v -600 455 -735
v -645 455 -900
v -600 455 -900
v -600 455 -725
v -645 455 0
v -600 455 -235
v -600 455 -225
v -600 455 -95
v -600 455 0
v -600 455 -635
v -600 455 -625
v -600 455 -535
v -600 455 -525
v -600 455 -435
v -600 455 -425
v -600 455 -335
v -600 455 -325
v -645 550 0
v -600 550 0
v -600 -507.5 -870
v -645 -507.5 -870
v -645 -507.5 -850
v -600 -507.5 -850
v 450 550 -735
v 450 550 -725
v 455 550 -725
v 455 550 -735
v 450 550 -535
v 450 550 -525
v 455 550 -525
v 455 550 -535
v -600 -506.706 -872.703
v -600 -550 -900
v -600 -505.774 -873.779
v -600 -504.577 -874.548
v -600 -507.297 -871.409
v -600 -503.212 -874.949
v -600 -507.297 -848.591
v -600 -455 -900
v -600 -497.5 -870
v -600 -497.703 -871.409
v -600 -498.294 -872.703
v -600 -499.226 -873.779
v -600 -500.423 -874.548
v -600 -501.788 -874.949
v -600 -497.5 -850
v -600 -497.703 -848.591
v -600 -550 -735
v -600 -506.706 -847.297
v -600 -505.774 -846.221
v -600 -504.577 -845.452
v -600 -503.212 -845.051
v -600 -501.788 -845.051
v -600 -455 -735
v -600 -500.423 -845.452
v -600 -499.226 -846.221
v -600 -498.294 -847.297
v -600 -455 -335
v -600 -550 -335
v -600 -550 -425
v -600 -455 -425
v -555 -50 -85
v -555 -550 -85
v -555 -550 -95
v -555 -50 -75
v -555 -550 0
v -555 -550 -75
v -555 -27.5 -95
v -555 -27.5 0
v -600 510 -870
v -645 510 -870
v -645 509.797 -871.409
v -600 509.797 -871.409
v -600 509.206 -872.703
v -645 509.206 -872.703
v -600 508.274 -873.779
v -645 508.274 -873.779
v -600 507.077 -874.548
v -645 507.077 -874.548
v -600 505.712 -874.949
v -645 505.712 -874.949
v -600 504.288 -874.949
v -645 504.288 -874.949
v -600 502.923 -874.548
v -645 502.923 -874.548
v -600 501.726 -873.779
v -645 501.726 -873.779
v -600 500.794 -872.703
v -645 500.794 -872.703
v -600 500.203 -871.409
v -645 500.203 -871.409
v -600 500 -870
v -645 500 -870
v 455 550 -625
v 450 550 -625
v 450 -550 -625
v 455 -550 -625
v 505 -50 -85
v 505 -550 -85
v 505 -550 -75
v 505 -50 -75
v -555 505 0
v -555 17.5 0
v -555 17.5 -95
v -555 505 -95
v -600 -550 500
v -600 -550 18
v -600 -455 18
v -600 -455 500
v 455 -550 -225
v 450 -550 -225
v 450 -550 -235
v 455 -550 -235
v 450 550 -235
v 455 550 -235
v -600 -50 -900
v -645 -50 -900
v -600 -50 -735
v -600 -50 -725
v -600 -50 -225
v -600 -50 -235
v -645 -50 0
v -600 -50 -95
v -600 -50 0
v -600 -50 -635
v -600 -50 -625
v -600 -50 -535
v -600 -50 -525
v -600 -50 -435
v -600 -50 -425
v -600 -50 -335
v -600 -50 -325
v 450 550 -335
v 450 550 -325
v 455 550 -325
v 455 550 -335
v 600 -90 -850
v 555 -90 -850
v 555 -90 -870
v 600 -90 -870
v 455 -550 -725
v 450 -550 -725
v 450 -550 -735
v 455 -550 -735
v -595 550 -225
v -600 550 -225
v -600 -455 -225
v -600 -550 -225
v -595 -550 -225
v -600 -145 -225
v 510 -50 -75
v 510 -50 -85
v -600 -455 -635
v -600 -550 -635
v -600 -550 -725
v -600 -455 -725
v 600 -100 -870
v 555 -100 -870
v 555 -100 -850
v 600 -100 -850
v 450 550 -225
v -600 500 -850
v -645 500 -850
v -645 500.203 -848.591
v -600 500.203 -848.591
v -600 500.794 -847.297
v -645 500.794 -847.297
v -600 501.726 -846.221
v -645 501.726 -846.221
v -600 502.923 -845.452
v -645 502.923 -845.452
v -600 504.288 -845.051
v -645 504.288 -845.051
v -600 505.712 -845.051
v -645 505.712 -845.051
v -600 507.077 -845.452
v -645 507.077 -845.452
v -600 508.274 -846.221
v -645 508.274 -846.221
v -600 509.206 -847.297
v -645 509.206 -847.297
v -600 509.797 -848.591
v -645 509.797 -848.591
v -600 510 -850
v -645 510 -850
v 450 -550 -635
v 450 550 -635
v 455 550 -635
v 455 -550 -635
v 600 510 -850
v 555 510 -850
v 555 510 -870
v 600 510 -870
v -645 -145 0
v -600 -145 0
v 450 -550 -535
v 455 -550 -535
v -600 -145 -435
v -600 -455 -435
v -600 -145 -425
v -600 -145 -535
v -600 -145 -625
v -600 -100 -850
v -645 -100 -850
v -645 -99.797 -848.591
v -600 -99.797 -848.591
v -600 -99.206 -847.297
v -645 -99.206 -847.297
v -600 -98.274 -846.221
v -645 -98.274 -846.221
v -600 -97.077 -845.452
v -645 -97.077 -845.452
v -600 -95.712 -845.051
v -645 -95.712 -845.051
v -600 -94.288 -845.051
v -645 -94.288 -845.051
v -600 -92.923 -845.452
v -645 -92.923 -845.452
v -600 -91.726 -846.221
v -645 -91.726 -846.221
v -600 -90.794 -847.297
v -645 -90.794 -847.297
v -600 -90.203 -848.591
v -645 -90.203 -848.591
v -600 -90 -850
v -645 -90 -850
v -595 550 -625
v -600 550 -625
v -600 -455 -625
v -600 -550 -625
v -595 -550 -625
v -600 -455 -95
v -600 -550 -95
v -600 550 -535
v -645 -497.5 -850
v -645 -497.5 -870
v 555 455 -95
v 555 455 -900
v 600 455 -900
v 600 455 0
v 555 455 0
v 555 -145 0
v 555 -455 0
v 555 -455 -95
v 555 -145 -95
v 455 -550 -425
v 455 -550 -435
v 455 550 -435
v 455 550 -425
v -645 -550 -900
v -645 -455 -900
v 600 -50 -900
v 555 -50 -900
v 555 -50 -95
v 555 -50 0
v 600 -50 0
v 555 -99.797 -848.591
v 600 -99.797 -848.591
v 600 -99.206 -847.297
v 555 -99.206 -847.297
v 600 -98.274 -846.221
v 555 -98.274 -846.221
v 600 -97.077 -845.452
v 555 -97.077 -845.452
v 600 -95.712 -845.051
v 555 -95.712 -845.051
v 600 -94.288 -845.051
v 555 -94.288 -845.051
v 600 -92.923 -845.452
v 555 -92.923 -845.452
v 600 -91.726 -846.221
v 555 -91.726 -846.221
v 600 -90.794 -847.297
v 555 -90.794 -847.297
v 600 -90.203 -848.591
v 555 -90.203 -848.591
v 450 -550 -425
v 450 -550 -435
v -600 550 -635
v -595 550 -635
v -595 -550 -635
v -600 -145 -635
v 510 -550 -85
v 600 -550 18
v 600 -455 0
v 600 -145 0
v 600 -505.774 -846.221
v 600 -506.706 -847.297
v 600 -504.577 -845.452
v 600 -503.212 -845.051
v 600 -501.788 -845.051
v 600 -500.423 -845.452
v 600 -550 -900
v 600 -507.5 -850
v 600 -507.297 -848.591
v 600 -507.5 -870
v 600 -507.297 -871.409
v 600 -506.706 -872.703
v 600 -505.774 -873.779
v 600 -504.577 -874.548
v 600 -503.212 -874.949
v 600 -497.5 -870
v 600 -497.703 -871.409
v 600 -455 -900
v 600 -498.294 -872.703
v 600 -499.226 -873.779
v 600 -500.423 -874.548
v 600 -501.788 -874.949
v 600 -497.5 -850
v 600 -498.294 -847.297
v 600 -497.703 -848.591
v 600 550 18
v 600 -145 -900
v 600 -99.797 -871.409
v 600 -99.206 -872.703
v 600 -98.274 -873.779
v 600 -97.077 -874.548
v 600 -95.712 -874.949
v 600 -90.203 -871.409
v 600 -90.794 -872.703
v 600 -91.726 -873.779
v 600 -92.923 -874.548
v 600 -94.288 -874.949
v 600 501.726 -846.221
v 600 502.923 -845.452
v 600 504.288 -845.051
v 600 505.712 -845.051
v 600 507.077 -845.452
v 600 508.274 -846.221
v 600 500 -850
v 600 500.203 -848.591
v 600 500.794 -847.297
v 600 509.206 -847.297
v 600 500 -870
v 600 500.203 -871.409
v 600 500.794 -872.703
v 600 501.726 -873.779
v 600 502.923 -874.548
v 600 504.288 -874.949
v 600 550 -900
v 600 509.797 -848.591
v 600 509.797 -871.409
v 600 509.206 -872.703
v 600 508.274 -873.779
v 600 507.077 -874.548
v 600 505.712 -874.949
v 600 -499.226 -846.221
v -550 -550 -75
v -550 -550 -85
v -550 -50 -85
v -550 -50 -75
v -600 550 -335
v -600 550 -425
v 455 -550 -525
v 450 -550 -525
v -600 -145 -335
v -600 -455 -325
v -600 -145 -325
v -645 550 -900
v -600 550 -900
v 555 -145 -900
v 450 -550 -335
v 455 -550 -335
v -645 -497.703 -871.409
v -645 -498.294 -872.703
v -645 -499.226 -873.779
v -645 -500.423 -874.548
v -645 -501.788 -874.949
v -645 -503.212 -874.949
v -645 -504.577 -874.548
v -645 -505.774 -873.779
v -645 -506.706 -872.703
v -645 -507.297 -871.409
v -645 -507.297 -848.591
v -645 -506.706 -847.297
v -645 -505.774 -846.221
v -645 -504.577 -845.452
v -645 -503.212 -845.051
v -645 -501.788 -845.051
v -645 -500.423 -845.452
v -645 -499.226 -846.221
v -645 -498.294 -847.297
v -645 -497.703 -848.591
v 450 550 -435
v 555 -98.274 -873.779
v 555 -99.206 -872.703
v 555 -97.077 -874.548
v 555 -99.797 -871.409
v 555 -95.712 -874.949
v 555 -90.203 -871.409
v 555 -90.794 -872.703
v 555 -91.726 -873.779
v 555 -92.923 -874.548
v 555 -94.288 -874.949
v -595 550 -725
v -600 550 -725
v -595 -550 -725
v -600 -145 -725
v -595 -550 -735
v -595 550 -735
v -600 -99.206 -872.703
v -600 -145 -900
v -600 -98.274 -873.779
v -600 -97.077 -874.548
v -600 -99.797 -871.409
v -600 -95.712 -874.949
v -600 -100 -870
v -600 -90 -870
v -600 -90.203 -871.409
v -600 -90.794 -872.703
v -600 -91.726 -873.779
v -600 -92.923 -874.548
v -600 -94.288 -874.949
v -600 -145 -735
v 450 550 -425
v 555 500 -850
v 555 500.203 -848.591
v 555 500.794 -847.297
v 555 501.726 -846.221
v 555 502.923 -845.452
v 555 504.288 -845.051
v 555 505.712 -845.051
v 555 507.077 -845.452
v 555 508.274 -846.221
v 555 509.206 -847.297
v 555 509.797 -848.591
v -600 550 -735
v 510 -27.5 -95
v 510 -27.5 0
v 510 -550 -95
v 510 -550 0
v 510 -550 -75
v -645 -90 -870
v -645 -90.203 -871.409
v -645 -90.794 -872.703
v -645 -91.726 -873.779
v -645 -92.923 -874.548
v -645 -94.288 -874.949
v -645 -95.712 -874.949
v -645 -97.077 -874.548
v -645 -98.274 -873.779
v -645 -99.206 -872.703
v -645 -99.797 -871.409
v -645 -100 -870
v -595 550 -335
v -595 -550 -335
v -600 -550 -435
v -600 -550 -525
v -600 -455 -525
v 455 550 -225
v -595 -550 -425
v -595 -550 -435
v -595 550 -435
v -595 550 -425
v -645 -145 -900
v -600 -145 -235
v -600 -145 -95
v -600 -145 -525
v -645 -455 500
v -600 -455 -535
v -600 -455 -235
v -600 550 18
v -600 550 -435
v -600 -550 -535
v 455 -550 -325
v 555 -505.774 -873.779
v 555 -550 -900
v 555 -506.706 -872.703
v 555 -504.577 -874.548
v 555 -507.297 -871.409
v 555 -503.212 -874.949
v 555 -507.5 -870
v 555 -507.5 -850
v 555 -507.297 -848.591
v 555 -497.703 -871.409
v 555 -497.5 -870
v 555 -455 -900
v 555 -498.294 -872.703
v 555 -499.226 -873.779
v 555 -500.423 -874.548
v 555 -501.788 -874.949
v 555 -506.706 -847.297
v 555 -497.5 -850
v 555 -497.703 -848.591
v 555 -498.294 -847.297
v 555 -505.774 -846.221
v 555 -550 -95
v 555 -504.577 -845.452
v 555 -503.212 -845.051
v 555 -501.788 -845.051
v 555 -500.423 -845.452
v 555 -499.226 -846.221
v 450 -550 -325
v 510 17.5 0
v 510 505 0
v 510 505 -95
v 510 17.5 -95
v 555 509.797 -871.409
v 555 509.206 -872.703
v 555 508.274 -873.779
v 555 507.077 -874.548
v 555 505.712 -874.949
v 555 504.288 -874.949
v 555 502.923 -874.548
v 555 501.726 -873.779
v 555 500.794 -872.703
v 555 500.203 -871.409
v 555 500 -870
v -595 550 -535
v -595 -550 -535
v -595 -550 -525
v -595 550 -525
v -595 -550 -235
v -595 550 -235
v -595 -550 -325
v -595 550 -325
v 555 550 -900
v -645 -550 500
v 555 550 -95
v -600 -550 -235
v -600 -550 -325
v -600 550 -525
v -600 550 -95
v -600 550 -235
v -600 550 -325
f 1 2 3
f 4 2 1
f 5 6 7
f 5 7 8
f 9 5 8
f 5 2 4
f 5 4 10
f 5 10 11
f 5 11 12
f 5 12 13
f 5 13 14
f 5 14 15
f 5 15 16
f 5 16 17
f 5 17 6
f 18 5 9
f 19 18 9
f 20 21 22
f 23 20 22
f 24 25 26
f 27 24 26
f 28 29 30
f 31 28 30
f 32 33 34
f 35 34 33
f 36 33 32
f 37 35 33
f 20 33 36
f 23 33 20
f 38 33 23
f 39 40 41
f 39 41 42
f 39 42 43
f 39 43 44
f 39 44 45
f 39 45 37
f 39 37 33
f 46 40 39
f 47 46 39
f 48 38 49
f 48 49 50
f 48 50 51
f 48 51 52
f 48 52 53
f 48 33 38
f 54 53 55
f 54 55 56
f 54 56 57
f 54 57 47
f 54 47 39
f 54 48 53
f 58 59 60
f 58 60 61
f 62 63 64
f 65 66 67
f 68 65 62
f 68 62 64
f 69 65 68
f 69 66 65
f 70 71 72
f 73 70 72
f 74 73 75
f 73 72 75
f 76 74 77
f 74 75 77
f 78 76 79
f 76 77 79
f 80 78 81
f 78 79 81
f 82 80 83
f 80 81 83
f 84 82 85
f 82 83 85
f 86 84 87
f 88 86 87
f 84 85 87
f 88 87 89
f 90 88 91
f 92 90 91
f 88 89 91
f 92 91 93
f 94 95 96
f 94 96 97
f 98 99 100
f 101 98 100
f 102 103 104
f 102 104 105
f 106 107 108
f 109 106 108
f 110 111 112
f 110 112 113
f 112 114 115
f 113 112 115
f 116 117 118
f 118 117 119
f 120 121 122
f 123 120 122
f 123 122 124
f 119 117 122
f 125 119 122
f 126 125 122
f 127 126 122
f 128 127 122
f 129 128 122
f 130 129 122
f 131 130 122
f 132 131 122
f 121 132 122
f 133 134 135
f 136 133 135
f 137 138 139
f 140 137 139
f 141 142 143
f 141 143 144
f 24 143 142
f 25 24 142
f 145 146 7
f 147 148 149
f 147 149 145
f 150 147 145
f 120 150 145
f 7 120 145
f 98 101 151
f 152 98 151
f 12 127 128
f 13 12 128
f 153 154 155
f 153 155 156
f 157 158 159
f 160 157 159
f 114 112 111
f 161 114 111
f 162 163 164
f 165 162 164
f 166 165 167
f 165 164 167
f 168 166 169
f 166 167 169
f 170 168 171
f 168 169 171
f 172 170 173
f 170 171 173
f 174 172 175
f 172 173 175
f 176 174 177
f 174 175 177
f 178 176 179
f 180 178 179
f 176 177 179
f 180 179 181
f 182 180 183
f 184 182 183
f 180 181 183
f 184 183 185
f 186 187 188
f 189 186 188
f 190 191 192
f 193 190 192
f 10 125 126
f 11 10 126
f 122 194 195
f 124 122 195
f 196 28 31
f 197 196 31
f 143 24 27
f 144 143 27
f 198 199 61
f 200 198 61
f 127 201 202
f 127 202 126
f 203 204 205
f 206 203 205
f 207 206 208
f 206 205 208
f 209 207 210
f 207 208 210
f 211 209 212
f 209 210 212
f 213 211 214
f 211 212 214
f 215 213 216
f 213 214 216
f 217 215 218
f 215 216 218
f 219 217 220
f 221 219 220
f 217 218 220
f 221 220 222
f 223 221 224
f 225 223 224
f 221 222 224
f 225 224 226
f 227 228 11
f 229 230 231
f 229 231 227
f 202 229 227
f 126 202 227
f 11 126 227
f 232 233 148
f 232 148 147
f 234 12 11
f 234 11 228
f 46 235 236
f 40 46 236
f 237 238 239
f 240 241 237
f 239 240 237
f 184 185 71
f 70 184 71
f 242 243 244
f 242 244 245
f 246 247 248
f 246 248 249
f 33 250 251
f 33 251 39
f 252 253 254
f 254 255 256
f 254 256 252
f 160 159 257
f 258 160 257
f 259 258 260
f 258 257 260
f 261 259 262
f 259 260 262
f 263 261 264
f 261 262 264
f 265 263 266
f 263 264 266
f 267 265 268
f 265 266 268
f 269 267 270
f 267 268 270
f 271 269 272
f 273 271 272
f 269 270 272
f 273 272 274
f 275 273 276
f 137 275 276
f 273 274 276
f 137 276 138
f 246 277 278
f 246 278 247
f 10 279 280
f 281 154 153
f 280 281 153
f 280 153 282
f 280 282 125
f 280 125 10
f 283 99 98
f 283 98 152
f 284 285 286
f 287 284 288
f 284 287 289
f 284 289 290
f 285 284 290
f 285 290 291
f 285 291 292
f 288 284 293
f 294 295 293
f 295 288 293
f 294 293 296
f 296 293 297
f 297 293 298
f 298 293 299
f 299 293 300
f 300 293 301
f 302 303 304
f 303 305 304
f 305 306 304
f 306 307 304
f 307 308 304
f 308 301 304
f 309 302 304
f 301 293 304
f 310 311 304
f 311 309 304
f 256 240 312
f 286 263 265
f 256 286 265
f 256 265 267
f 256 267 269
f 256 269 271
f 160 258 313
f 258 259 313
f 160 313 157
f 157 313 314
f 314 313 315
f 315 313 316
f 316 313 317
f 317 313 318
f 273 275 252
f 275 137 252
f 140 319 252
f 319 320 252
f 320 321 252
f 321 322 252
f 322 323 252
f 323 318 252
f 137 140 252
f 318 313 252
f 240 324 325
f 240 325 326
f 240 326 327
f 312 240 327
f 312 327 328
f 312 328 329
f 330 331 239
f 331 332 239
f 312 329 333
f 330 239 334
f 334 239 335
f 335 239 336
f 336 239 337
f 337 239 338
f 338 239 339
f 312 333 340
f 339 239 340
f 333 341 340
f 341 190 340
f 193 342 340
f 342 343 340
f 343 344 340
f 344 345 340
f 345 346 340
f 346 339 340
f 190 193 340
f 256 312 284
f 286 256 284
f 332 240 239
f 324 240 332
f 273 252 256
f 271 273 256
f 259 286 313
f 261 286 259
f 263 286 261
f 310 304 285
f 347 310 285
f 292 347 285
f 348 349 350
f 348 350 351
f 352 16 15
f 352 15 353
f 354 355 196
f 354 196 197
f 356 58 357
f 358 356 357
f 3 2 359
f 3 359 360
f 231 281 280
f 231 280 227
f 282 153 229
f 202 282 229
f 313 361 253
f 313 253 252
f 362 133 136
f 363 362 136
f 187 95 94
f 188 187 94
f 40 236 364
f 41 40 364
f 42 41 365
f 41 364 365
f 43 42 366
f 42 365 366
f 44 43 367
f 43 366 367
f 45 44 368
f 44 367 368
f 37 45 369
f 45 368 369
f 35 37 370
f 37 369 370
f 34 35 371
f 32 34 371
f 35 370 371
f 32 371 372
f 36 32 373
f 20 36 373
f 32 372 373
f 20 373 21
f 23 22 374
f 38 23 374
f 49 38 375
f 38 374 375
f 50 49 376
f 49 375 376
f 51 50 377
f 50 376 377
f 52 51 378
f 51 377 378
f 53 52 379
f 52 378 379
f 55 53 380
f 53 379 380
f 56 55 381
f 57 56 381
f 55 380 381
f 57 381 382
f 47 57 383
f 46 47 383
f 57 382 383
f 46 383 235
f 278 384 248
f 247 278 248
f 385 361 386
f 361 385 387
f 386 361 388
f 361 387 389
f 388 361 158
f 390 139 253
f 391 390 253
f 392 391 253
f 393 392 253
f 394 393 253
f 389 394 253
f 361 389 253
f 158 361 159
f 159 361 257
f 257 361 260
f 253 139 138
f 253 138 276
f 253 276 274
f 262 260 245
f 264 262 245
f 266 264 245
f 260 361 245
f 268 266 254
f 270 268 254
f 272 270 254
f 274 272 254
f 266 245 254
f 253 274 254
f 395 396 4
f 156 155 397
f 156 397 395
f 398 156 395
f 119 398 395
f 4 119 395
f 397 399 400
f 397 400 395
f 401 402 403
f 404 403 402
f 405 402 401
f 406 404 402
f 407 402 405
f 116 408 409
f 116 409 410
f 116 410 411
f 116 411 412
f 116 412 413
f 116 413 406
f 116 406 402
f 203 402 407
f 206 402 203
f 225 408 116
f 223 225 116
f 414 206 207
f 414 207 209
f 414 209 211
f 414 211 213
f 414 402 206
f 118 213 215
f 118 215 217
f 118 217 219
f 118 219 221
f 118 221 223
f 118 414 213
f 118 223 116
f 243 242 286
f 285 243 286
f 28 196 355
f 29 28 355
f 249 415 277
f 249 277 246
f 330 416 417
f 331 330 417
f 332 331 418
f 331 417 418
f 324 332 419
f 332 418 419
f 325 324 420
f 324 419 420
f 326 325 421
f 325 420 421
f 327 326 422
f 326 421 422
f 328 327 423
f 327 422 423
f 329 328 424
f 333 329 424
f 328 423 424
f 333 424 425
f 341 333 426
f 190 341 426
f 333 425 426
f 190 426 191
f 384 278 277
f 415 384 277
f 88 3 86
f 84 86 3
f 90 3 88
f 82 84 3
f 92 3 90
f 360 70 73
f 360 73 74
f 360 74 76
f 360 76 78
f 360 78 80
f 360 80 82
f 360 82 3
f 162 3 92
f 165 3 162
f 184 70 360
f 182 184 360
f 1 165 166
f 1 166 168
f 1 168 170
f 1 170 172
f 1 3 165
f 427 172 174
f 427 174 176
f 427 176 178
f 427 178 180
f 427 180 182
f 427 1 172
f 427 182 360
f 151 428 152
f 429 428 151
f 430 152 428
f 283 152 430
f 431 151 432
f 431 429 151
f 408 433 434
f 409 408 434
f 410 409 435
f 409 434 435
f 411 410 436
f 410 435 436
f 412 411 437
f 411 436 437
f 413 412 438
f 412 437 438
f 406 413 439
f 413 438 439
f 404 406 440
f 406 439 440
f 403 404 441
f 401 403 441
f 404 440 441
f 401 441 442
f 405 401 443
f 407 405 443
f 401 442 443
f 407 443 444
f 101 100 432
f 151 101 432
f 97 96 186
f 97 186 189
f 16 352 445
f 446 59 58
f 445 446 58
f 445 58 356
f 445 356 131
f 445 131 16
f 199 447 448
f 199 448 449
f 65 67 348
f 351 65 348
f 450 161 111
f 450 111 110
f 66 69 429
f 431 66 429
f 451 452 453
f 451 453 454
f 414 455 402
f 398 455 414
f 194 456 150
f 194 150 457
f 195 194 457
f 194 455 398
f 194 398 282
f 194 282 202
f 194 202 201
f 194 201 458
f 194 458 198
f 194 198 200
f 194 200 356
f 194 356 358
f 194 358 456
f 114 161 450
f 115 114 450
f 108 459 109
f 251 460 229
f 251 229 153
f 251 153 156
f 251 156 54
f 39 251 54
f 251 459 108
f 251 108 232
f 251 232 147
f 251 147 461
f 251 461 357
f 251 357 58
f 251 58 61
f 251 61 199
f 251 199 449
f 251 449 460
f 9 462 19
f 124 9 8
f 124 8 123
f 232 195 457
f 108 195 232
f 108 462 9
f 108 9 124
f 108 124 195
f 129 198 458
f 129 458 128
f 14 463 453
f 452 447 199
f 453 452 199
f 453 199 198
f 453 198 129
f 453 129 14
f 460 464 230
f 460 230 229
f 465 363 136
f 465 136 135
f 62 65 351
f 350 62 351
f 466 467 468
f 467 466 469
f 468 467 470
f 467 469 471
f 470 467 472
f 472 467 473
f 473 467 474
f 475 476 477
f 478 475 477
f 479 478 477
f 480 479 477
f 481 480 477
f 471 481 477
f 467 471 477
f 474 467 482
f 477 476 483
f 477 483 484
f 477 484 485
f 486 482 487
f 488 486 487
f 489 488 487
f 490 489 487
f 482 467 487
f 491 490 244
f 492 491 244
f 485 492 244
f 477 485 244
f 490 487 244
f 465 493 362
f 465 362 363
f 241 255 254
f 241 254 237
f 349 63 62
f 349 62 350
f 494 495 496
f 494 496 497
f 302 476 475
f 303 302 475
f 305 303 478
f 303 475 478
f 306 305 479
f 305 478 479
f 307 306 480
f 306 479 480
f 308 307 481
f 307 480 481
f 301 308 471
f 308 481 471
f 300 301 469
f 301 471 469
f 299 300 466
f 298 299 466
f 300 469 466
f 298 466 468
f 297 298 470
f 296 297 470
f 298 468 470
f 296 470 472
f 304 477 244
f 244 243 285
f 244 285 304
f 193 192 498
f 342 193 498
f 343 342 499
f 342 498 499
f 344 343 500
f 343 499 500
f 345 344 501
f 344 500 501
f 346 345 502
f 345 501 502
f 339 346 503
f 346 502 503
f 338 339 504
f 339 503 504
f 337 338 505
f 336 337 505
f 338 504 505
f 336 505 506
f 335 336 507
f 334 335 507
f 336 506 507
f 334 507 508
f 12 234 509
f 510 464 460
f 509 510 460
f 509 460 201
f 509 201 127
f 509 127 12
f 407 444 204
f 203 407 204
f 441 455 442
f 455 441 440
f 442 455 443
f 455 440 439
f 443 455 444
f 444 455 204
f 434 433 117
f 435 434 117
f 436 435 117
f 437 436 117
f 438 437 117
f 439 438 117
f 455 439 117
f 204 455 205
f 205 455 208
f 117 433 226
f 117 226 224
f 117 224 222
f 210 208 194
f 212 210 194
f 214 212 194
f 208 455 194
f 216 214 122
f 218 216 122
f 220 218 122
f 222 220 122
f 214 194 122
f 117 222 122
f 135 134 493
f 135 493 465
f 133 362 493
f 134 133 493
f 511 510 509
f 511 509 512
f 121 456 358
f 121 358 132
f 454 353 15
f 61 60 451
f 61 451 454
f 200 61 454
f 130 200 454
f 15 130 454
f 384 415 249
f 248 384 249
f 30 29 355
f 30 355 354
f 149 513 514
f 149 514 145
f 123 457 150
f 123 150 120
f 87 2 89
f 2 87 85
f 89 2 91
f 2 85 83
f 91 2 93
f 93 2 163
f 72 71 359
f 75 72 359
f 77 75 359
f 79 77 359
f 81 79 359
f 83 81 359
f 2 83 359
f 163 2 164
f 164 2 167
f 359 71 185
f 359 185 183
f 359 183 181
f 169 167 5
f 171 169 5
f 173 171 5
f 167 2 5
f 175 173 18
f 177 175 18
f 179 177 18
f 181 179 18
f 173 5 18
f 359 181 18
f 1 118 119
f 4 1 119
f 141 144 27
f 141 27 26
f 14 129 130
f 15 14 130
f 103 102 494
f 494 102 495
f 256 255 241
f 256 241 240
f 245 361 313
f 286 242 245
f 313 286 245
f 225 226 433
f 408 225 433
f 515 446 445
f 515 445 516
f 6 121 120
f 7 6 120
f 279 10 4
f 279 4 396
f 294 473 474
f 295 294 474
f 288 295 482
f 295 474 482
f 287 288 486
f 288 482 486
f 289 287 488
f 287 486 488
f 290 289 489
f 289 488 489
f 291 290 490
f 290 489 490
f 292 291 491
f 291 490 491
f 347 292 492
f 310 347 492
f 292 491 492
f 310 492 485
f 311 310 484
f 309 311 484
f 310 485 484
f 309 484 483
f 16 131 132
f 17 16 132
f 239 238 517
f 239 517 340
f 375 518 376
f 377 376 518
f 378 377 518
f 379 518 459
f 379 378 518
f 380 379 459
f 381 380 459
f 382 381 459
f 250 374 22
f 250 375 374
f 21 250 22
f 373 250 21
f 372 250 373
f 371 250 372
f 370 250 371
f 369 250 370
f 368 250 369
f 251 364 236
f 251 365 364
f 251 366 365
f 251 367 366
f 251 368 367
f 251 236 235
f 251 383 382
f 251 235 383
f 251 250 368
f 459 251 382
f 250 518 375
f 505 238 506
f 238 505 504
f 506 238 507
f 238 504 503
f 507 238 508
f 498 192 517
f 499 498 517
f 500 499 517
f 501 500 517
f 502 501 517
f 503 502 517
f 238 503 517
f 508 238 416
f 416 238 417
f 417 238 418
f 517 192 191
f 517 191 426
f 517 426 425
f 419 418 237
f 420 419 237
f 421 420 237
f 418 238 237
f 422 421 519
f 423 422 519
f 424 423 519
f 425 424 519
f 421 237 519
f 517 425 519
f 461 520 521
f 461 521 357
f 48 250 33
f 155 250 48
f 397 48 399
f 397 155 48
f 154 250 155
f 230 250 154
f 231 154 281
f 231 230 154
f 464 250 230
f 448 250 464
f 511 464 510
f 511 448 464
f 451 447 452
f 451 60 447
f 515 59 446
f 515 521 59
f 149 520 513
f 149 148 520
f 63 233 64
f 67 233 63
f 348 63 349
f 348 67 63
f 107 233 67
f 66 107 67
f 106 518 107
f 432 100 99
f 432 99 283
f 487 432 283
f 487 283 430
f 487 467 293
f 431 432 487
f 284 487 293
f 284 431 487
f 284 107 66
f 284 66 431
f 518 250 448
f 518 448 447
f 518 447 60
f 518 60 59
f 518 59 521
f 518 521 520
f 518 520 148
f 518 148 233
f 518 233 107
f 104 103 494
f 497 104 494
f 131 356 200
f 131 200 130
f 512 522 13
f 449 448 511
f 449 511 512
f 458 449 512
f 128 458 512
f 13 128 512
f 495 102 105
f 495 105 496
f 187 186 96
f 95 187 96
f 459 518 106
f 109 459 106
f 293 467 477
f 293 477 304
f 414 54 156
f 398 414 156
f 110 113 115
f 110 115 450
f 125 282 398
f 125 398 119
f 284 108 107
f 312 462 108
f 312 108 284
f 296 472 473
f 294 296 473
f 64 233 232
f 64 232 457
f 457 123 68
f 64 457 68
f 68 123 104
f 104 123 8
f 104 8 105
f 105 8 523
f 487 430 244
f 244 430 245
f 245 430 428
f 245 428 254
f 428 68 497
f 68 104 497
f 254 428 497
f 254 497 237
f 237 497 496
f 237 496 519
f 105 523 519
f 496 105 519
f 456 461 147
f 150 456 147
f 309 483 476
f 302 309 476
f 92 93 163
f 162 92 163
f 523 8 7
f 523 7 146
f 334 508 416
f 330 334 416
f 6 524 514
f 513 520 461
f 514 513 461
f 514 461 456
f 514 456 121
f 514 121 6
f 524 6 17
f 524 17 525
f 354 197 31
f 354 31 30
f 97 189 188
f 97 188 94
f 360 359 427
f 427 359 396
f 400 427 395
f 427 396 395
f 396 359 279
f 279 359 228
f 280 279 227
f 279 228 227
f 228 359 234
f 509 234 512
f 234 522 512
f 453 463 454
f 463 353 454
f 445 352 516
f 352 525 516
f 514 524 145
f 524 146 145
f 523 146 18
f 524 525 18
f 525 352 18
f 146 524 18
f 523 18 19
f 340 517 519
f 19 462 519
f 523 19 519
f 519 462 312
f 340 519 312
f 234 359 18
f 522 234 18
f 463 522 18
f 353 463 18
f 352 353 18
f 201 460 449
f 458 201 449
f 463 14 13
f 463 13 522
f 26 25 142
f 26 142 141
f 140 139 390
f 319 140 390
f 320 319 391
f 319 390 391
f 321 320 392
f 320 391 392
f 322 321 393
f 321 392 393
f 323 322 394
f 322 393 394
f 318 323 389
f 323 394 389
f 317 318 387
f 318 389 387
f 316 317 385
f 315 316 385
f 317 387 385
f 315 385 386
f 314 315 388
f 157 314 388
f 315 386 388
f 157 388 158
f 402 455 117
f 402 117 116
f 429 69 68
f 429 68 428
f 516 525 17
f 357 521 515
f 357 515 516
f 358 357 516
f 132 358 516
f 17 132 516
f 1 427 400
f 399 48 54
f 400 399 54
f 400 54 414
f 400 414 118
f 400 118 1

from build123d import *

# Parameters (mm, degrees)
F0_W      = 1200
F0_H      = 1100
F2_DEPTH  = 18
F3_W      = 45
F3_H      = 95
F4_DEPTH  = 900
F5_DEPTH  = 500
F1_W      = 1065
F1_H      = 45
F6_DEPTH  = 95
F8_DEPTH  = 2000
F9_W      = 5
F9_H      = 10
F10_DEPTH = 500
F11_W     = 5
F11_H     = 10
F12_DEPTH = 500
F13_W     = 5
F13_H     = 10
F14_DEPTH = 1100


with BuildPart() as f2:
    # F0 (on Top) → F2 (new body)
    with BuildSketch(Plane.XY):
        Rectangle(F0_W, F0_H)
    extrude(amount=F2_DEPTH)

    # F3 (on Top) → F4 (join)
    with BuildSketch(Plane.XY):
        with Locations((-622.5, 502.5)):
            Rectangle(F3_W, F3_H)
        with Locations((-622.5, -97.5)):
            Rectangle(F3_W, F3_H)
        with Locations((-622.5, -502.5)):
            Rectangle(F3_W, F3_H)
        with Locations((577.5, -502.5)):
            Rectangle(F3_W, F3_H)
        with Locations((577.5, -97.5)):
            Rectangle(F3_W, F3_H)
        with Locations((577.5, 502.5)):
            Rectangle(F3_W, F3_H)
    extrude(amount=-F4_DEPTH)

    # F5 (add): a face of the model
    f5_faces = [f2.faces().sort_by_distance(p)[0] for p in [
        (-622.5, -502.5, 0),
    ]]
    extrude(f5_faces, amount=F5_DEPTH)

    # F1 (on Top) → F6 (join)
    with BuildSketch(Plane.XY):
        Polygon((-555, 550), (-600, 550), (-600, -550), (-555, -550), (-555, -27.5), (-555, 17.5), (-555, 505), align=None)
        with Locations((-22.5, 527.5)):
            Rectangle(F1_W, F1_H)
        with Locations((-22.5, -5)):
            Rectangle(F1_W, F1_H)
        Polygon((555, 550), (510, 550), (510, 505), (510, 17.5), (510, -27.5), (510, -550), (555, -550), align=None)
    extrude(amount=-F6_DEPTH)

    # F7 (on face) → F8 (cut)
    with BuildSketch(Plane(origin=(-645, 0, 0), x_dir=(0, -1, 0), z_dir=(-1, 0, 0))):
        with BuildLine():
            ThreePointArc((507.5, -870), (502.5, -865), (497.5, -870))
            Line((497.5, -870), (507.5, -870))
        make_face()
        with BuildLine():
            Line((497.5, -850), (497.5, -870))
            ThreePointArc((497.5, -870), (502.5, -865), (507.5, -870))
            Line((507.5, -870), (507.5, -850))
            ThreePointArc((507.5, -850), (502.5, -855), (497.5, -850))
        make_face()
        with BuildLine():
            Line((507.5, -870), (497.5, -870))
            ThreePointArc((497.5, -870), (502.5, -875), (507.5, -870))
        make_face()
        with BuildLine():
            ThreePointArc((507.5, -850), (502.5, -845), (497.5, -850))
            Line((497.5, -850), (507.5, -850))
        make_face()
        with BuildLine():
            Line((507.5, -850), (497.5, -850))
            ThreePointArc((497.5, -850), (502.5, -855), (507.5, -850))
        make_face()
        with BuildLine():
            ThreePointArc((100, -850), (95, -845), (90, -850))
            Line((90, -850), (100, -850))
        make_face()
        with BuildLine():
            ThreePointArc((100, -850), (95, -855), (90, -850))
            Line((90, -850), (90, -870))
            ThreePointArc((90, -870), (95, -865), (100, -870))
            Line((100, -870), (100, -850))
        make_face()
        with BuildLine():
            Line((100, -850), (90, -850))
            ThreePointArc((90, -850), (95, -855), (100, -850))
        make_face()
        with BuildLine():
            ThreePointArc((100, -870), (95, -865), (90, -870))
            Line((90, -870), (100, -870))
        make_face()
        with BuildLine():
            Line((100, -870), (90, -870))
            ThreePointArc((90, -870), (95, -875), (100, -870))
        make_face()
        with BuildLine():
            ThreePointArc((-500, -850), (-505, -845), (-510, -850))
            Line((-510, -850), (-500, -850))
        make_face()
        with BuildLine():
            ThreePointArc((-500, -850), (-505, -855), (-510, -850))
            Line((-510, -850), (-510, -870))
            ThreePointArc((-510, -870), (-505, -865), (-500, -870))
            Line((-500, -870), (-500, -850))
        make_face()
        with BuildLine():
            Line((-500, -850), (-510, -850))
            ThreePointArc((-510, -850), (-505, -855), (-500, -850))
        make_face()
        with BuildLine():
            ThreePointArc((-500, -870), (-505, -865), (-510, -870))
            Line((-510, -870), (-500, -870))
        make_face()
        with BuildLine():
            Line((-500, -870), (-510, -870))
            ThreePointArc((-510, -870), (-505, -875), (-500, -870))
        make_face()
    extrude(amount=-F8_DEPTH, mode=Mode.SUBTRACT)

    # F9 (on face) → F10 (join)
    with BuildSketch(Plane.XZ.offset(550)):
        with Locations((-552.5, -80)):
            Rectangle(F9_W, F9_H)
    extrude(amount=-F10_DEPTH)

    # F11 (on face) → F12 (join)
    with BuildSketch(Plane.XZ.offset(550)):
        with Locations((507.5, -80)):
            Rectangle(F11_W, F11_H)
    extrude(amount=-F12_DEPTH)

    # F13 (on face) → F14 (join)
    with BuildSketch(Plane.XZ.offset(550)):
        with Locations((-597.5, -230)):
            Rectangle(F13_W, F13_H)
        with Locations((-597.5, -330)):
            Rectangle(F13_W, F13_H)
        with Locations((-597.5, -430)):
            Rectangle(F13_W, F13_H)
        with Locations((-597.5, -530)):
            Rectangle(F13_W, F13_H)
        with Locations((-597.5, -630)):
            Rectangle(F13_W, F13_H)
        with Locations((-597.5, -730)):
            Rectangle(F13_W, F13_H)
    extrude(amount=-F14_DEPTH)


with BuildPart() as f14:
    # F13 (on face) → F14, piece 2 (new body)
    with BuildSketch(Plane.XZ.offset(550)):
        with Locations((452.5, -230)):
            Rectangle(F13_W, F13_H)
    extrude(amount=-F14_DEPTH)


with BuildPart() as f14b:
    # F13 (on face) → F14, piece 3 (new body)
    with BuildSketch(Plane.XZ.offset(550)):
        with Locations((452.5, -330)):
            Rectangle(F13_W, F13_H)
    extrude(amount=-F14_DEPTH)


with BuildPart() as f14c:
    # F13 (on face) → F14, piece 4 (new body)
    with BuildSketch(Plane.XZ.offset(550)):
        with Locations((452.5, -430)):
            Rectangle(F13_W, F13_H)
    extrude(amount=-F14_DEPTH)


with BuildPart() as f14d:
    # F13 (on face) → F14, piece 5 (new body)
    with BuildSketch(Plane.XZ.offset(550)):
        with Locations((452.5, -530)):
            Rectangle(F13_W, F13_H)
    extrude(amount=-F14_DEPTH)


with BuildPart() as f14e:
    # F13 (on face) → F14, piece 6 (new body)
    with BuildSketch(Plane.XZ.offset(550)):
        with Locations((452.5, -630)):
            Rectangle(F13_W, F13_H)
    extrude(amount=-F14_DEPTH)


with BuildPart() as f14f:
    # F13 (on face) → F14, piece 7 (new body)
    with BuildSketch(Plane.XZ.offset(550)):
        with Locations((452.5, -730)):
            Rectangle(F13_W, F13_H)
    extrude(amount=-F14_DEPTH)


solid = Compound([f2.part, f14.part, f14b.part, f14c.part, f14d.part, f14e.part, f14f.part])
